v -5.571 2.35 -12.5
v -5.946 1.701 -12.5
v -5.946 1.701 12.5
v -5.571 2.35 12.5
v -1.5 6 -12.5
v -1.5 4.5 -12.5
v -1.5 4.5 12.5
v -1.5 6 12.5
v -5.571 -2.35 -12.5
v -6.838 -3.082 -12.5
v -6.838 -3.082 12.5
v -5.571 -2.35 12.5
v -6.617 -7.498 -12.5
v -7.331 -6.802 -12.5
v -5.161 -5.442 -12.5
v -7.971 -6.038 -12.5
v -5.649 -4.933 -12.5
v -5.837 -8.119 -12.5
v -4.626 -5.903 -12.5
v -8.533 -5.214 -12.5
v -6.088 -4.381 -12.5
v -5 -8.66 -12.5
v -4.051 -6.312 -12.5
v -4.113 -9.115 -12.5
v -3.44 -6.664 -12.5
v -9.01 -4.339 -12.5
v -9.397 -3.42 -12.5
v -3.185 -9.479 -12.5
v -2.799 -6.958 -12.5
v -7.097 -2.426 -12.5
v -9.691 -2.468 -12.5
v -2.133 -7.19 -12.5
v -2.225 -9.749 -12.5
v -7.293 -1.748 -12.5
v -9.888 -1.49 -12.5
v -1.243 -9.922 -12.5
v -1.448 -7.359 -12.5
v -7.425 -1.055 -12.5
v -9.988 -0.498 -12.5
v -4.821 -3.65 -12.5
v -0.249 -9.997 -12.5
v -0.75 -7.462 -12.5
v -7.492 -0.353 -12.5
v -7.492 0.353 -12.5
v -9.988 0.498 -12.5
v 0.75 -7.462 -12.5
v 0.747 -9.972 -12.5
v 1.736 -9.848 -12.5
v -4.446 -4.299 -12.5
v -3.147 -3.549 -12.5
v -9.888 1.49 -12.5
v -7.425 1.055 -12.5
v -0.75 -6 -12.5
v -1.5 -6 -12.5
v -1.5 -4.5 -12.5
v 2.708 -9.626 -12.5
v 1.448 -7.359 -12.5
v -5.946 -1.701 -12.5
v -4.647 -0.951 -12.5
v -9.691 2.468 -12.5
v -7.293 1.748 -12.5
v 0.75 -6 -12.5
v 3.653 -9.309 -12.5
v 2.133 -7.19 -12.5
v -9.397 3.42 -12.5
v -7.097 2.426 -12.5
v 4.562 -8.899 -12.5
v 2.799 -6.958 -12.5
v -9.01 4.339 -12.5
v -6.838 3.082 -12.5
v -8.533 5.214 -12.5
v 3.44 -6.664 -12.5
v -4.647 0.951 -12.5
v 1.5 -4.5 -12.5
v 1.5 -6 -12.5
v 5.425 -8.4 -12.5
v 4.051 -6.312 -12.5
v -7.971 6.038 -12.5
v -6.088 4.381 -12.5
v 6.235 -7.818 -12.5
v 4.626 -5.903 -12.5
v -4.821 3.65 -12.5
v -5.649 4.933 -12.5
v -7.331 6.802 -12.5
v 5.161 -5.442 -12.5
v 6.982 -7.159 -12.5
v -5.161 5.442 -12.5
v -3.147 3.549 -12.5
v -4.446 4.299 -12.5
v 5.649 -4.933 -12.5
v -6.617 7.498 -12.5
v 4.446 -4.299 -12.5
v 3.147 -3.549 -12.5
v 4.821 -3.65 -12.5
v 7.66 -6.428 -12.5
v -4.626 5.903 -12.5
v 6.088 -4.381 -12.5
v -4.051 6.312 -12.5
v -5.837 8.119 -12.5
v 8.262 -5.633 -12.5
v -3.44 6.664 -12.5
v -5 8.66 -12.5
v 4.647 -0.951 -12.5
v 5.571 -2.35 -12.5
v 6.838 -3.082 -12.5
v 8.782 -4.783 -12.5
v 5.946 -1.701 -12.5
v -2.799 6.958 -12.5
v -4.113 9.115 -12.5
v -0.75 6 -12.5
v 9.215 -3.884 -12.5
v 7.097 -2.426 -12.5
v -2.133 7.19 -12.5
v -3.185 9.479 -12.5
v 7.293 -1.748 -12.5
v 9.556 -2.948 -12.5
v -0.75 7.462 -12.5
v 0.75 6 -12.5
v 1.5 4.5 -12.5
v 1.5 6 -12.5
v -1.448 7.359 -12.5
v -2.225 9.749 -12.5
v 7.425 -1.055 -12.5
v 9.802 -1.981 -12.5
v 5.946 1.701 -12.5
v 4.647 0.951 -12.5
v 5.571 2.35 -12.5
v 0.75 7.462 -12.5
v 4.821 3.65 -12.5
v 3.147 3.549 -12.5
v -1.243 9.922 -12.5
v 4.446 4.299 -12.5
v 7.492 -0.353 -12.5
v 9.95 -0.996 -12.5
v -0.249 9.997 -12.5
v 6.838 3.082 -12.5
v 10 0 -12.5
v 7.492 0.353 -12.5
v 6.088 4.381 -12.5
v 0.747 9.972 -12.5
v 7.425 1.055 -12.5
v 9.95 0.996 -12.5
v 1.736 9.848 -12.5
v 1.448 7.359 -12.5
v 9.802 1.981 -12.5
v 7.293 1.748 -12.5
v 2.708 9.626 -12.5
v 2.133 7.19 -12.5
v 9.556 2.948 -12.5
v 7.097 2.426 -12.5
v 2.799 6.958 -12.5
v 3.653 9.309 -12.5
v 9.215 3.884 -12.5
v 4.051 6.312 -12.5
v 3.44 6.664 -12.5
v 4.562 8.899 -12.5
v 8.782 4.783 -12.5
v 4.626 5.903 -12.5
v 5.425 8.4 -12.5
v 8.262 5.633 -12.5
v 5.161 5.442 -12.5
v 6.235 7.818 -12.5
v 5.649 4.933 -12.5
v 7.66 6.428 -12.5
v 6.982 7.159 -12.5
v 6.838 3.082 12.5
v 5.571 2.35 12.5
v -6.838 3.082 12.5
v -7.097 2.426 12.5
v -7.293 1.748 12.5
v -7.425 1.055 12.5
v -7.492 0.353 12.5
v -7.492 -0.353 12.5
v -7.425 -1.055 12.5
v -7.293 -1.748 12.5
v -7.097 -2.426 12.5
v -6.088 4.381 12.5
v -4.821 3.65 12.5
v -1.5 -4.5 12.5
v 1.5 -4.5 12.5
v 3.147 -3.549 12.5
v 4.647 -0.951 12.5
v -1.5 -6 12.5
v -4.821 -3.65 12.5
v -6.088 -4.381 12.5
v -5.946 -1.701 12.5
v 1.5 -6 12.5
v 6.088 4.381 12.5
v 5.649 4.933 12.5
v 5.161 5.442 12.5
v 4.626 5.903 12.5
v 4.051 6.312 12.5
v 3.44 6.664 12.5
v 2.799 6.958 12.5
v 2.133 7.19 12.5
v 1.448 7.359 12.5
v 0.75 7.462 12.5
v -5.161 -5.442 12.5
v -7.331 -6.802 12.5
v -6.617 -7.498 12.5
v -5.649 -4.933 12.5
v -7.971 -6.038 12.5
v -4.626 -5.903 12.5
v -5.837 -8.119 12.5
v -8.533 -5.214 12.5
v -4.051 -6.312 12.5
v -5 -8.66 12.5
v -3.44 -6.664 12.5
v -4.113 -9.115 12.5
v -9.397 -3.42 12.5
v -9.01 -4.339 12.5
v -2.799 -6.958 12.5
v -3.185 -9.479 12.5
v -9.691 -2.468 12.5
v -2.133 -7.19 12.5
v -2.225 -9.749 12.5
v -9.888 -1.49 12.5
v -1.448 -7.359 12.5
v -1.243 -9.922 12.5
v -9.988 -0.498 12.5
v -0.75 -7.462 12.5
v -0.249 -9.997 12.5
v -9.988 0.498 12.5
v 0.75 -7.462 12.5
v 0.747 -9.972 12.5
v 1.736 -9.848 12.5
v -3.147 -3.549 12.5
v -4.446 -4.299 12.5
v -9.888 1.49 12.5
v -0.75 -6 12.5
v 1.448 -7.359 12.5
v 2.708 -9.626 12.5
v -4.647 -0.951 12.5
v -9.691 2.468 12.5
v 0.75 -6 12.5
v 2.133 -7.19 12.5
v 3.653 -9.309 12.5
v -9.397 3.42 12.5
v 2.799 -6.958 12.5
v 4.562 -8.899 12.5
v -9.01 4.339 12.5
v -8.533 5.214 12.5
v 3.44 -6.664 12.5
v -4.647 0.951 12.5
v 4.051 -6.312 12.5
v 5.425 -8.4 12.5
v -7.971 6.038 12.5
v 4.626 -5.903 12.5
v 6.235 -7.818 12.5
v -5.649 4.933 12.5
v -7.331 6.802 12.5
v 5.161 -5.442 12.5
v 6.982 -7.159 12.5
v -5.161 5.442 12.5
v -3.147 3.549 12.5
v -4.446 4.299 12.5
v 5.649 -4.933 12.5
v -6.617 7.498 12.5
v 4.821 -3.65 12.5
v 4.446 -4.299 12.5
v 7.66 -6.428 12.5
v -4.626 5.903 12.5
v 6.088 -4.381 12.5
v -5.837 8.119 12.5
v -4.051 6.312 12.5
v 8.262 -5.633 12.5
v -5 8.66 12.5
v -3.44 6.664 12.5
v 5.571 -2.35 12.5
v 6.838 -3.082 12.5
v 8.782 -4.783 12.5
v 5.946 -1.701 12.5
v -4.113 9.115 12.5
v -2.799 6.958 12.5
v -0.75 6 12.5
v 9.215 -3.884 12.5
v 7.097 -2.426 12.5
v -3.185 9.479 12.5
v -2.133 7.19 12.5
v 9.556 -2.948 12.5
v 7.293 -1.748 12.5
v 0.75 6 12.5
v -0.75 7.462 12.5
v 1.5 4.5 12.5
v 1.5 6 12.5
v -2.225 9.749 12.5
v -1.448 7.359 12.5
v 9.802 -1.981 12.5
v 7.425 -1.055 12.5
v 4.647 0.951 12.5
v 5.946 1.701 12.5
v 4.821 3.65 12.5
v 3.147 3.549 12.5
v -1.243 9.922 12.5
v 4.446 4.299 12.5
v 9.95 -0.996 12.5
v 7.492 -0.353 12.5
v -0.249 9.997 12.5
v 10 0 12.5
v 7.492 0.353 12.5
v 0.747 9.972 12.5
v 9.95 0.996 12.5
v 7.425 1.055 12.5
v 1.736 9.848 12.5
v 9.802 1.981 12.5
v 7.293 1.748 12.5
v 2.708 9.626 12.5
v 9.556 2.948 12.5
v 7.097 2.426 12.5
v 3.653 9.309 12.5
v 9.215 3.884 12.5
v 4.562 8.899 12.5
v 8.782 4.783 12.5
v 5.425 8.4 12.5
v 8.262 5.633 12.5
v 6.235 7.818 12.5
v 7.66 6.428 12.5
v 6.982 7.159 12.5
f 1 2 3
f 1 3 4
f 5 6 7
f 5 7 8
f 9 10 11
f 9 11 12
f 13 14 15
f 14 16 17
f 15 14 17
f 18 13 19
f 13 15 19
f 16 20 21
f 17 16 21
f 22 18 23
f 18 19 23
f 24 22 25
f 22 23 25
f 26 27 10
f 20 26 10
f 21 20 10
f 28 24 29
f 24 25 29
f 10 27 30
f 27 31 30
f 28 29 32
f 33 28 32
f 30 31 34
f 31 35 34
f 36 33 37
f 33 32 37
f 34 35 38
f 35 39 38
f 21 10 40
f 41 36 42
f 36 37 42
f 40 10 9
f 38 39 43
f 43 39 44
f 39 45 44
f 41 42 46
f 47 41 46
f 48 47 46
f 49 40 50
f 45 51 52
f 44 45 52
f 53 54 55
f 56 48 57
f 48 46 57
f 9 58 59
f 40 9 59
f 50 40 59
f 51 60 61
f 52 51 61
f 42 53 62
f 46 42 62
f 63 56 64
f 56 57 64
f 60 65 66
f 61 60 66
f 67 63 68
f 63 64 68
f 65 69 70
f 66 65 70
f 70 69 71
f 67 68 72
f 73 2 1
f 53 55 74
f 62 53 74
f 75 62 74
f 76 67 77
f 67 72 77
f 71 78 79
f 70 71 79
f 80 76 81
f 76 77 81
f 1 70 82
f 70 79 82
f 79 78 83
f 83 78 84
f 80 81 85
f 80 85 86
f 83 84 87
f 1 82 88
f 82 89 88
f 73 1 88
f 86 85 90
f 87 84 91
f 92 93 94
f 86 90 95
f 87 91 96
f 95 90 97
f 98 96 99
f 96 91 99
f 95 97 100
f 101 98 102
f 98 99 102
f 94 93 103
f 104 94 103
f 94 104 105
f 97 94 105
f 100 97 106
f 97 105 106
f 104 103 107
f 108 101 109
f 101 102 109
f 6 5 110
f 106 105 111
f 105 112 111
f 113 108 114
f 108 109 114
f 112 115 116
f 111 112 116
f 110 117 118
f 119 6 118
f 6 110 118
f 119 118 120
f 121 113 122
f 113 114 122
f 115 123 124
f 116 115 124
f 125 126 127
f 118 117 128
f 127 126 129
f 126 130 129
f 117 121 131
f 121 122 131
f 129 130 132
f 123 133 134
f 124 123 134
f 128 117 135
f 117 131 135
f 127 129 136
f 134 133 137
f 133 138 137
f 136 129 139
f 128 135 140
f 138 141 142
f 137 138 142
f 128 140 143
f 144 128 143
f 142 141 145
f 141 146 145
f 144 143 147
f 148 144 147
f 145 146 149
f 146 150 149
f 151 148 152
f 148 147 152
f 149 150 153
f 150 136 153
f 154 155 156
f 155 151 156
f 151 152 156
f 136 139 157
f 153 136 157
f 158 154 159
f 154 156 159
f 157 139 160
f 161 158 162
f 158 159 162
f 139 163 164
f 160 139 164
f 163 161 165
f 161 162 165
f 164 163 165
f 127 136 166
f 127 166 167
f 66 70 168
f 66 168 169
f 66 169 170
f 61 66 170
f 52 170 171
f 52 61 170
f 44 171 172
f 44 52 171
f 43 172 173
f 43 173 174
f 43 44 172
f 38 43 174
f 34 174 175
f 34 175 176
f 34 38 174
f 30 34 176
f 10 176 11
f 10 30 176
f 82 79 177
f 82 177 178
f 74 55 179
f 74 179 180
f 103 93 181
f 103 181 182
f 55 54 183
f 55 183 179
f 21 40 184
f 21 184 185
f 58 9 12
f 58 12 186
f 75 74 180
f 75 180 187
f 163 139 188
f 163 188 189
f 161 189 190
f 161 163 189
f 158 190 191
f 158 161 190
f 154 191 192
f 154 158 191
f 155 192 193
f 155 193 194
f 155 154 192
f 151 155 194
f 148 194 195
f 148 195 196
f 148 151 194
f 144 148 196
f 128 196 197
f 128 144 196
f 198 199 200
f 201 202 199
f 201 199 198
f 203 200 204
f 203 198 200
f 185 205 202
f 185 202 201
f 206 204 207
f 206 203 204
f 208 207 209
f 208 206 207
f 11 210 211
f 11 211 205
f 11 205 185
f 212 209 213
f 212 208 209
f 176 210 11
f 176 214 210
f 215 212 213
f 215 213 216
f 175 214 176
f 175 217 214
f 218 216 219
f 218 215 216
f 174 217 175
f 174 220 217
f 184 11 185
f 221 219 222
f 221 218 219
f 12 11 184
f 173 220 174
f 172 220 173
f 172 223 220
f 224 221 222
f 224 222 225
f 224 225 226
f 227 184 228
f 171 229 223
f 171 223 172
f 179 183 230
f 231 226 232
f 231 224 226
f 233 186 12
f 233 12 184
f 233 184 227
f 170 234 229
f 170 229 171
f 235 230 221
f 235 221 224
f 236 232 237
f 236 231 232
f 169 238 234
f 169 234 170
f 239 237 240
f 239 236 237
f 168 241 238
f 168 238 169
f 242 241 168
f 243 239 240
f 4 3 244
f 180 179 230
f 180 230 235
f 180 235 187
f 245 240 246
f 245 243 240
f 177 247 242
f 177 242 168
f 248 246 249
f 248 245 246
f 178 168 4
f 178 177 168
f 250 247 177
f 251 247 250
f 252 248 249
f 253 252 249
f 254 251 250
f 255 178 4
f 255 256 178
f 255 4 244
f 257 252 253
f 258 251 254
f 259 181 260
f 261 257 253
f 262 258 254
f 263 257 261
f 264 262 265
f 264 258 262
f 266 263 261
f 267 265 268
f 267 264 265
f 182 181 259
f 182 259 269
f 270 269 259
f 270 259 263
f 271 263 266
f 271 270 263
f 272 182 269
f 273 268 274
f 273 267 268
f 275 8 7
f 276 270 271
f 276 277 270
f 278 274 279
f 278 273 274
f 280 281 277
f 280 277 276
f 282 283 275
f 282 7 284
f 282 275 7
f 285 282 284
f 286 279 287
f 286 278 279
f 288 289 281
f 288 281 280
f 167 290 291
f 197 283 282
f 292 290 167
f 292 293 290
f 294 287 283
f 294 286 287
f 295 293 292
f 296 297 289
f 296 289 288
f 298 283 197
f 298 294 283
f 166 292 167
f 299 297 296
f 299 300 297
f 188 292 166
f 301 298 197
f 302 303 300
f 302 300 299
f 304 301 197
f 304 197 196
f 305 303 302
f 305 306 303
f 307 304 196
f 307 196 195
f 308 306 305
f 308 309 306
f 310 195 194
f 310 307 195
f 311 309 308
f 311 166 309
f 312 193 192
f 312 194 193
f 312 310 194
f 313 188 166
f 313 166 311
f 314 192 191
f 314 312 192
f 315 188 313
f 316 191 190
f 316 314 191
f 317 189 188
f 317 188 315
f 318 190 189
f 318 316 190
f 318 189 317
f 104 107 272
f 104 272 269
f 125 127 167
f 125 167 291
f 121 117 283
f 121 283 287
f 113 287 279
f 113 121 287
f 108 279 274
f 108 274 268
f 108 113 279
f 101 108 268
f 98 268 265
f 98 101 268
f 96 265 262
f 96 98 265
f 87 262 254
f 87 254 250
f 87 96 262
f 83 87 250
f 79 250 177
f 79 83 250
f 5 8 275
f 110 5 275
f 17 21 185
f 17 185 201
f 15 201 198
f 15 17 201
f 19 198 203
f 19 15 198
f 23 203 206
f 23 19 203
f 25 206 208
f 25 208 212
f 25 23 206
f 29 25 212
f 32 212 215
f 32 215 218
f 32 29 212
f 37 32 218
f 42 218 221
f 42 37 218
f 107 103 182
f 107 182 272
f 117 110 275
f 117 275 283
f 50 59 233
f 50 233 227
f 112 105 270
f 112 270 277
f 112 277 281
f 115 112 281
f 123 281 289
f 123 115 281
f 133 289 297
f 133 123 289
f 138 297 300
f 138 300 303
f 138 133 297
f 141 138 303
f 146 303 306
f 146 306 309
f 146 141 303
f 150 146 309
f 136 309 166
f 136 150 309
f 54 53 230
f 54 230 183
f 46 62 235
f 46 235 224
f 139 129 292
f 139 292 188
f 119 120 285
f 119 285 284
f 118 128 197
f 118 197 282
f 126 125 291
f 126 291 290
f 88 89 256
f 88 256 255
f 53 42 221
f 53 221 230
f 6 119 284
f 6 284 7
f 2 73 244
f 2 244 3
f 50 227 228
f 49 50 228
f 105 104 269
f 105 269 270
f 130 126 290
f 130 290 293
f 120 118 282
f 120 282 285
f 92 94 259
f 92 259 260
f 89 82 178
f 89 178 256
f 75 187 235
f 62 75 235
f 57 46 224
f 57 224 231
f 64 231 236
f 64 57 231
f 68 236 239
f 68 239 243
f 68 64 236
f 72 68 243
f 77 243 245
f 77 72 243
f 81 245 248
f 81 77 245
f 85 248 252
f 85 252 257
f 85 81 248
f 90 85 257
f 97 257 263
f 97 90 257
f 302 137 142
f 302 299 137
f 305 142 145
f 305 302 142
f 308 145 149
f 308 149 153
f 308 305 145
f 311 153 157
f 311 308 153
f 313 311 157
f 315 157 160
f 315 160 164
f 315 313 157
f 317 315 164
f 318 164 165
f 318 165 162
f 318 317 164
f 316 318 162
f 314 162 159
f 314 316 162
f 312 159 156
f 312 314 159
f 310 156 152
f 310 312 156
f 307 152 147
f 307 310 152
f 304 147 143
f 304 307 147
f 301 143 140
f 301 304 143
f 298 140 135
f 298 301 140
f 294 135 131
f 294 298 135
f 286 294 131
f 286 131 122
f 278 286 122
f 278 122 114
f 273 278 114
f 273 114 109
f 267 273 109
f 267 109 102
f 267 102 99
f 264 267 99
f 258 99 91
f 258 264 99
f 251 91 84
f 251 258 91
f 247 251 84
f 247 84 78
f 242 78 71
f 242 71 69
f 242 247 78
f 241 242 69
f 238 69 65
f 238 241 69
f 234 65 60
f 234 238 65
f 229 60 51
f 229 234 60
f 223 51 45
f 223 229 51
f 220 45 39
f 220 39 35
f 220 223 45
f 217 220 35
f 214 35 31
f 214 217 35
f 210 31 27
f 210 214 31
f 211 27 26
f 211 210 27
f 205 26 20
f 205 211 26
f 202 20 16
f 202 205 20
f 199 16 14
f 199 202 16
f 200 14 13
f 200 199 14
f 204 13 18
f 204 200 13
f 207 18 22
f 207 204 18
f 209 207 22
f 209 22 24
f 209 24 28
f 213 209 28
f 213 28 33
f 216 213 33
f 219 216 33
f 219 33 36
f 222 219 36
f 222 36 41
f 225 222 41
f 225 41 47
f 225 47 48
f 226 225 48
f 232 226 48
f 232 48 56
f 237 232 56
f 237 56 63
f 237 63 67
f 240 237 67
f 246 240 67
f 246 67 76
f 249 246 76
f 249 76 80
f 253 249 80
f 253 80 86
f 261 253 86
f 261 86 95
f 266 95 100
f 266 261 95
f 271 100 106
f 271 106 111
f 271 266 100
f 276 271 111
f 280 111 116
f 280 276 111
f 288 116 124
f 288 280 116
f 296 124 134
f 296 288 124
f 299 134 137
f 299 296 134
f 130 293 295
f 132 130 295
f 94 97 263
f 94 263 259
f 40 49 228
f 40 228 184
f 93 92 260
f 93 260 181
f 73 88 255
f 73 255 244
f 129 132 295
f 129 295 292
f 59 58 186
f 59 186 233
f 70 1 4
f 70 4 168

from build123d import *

# Parameters (mm, degrees)
ESBO_O1_R                = 10
RESSALTO_EXTRUS_O1_DEPTH = 12.5
CAVIDADE1_START          = -12.5
CAVIDADE1_DEPTH          = 25


# Read off the part's stored shape, not the designer's step: Cavidade1
with BuildPart() as part:
    # Esboço1 → Ressalto-extrusão1 (new, symmetric)
    with BuildSketch(Plane.XY):
        Circle(ESBO_O1_R)
    extrude(amount=RESSALTO_EXTRUS_O1_DEPTH, both=True)

    # Cavidade1 outline → Cavidade1 (cut)
    with BuildSketch(Plane.XY.offset(CAVIDADE1_START)):
        with BuildLine():
            Line((4.446152423, 4.299038106), (4.821152423, 3.649519053))
            Line((4.821152423, 3.649519053), (6.087632977, 4.380721942))
            ThreePointArc((6.087632977, 4.380721942), (3.75, 6.495190528), (0.75, 7.462405778))
            Line((0.75, 7.462405778), (0.75, 6))
            Line((0.75, 6), (1.5, 6))
            Line((1.5, 6), (1.5, 4.5))
            Line((1.5, 4.5), (-1.5, 4.5))
            Line((-1.5, 4.5), (-1.5, 6))
            Line((-1.5, 6), (-0.75, 6))
            Line((-0.75, 6), (-0.75, 7.462405778))
            ThreePointArc((-0.75, 7.462405778), (-3.75, 6.495190528), (-6.087632977, 4.380721942))
            Line((-6.087632977, 4.380721942), (-4.821152423, 3.649519053))
            Line((-4.821152423, 3.649519053), (-4.446152423, 4.299038106))
            Line((-4.446152423, 4.299038106), (-3.147114317, 3.549038106))
            Line((-3.147114317, 3.549038106), (-4.647114317, 0.950961894))
            Line((-4.647114317, 0.950961894), (-5.946152423, 1.700961894))
            Line((-5.946152423, 1.700961894), (-5.571152423, 2.350480947))
            Line((-5.571152423, 2.350480947), (-6.837632977, 3.081683836))
            ThreePointArc((-6.837632977, 3.081683836), (-7.5, 0), (-6.837632977, -3.081683836))
            Line((-6.837632977, -3.081683836), (-5.571152423, -2.350480947))
            Line((-5.571152423, -2.350480947), (-5.946152423, -1.700961894))
            Line((-5.946152423, -1.700961894), (-4.647114317, -0.950961894))
            Line((-4.647114317, -0.950961894), (-3.147114317, -3.549038106))
            Line((-3.147114317, -3.549038106), (-4.446152423, -4.299038106))
            Line((-4.446152423, -4.299038106), (-4.821152423, -3.649519053))
            Line((-4.821152423, -3.649519053), (-6.087632977, -4.380721942))
            ThreePointArc((-6.087632977, -4.380721942), (-3.75, -6.495190528), (-0.75, -7.462405778))
            Line((-0.75, -7.462405778), (-0.75, -6))
            Line((-0.75, -6), (-1.5, -6))
            Line((-1.5, -6), (-1.5, -4.5))
            Line((-1.5, -4.5), (1.5, -4.5))
            Line((1.5, -4.5), (1.5, -6))
            Line((1.5, -6), (0.75, -6))
            Line((0.75, -6), (0.75, -7.462405778))
            ThreePointArc((0.75, -7.462405778), (3.75, -6.495190528), (6.087632977, -4.380721942))
            Line((6.087632977, -4.380721942), (4.821152423, -3.649519053))
            Line((4.821152423, -3.649519053), (4.446152423, -4.299038106))
            Line((4.446152423, -4.299038106), (3.147114317, -3.549038106))
            Line((3.147114317, -3.549038106), (4.647114317, -0.950961894))
            Line((4.647114317, -0.950961894), (5.946152423, -1.700961894))
            Line((5.946152423, -1.700961894), (5.571152423, -2.350480947))
            Line((5.571152423, -2.350480947), (6.837632977, -3.081683836))
            ThreePointArc((6.837632977, -3.081683836), (7.5, 0), (6.837632977, 3.081683836))
            Line((6.837632977, 3.081683836), (5.571152423, 2.350480947))
            Line((5.571152423, 2.350480947), (5.946152423, 1.700961894))
            Line((5.946152423, 1.700961894), (4.647114317, 0.950961894))
            Line((4.647114317, 0.950961894), (3.147114317, 3.549038106))
            Line((3.147114317, 3.549038106), (4.446152423, 4.299038106))
        make_face()
    extrude(amount=CAVIDADE1_DEPTH, mode=Mode.SUBTRACT)


solid = part.part
